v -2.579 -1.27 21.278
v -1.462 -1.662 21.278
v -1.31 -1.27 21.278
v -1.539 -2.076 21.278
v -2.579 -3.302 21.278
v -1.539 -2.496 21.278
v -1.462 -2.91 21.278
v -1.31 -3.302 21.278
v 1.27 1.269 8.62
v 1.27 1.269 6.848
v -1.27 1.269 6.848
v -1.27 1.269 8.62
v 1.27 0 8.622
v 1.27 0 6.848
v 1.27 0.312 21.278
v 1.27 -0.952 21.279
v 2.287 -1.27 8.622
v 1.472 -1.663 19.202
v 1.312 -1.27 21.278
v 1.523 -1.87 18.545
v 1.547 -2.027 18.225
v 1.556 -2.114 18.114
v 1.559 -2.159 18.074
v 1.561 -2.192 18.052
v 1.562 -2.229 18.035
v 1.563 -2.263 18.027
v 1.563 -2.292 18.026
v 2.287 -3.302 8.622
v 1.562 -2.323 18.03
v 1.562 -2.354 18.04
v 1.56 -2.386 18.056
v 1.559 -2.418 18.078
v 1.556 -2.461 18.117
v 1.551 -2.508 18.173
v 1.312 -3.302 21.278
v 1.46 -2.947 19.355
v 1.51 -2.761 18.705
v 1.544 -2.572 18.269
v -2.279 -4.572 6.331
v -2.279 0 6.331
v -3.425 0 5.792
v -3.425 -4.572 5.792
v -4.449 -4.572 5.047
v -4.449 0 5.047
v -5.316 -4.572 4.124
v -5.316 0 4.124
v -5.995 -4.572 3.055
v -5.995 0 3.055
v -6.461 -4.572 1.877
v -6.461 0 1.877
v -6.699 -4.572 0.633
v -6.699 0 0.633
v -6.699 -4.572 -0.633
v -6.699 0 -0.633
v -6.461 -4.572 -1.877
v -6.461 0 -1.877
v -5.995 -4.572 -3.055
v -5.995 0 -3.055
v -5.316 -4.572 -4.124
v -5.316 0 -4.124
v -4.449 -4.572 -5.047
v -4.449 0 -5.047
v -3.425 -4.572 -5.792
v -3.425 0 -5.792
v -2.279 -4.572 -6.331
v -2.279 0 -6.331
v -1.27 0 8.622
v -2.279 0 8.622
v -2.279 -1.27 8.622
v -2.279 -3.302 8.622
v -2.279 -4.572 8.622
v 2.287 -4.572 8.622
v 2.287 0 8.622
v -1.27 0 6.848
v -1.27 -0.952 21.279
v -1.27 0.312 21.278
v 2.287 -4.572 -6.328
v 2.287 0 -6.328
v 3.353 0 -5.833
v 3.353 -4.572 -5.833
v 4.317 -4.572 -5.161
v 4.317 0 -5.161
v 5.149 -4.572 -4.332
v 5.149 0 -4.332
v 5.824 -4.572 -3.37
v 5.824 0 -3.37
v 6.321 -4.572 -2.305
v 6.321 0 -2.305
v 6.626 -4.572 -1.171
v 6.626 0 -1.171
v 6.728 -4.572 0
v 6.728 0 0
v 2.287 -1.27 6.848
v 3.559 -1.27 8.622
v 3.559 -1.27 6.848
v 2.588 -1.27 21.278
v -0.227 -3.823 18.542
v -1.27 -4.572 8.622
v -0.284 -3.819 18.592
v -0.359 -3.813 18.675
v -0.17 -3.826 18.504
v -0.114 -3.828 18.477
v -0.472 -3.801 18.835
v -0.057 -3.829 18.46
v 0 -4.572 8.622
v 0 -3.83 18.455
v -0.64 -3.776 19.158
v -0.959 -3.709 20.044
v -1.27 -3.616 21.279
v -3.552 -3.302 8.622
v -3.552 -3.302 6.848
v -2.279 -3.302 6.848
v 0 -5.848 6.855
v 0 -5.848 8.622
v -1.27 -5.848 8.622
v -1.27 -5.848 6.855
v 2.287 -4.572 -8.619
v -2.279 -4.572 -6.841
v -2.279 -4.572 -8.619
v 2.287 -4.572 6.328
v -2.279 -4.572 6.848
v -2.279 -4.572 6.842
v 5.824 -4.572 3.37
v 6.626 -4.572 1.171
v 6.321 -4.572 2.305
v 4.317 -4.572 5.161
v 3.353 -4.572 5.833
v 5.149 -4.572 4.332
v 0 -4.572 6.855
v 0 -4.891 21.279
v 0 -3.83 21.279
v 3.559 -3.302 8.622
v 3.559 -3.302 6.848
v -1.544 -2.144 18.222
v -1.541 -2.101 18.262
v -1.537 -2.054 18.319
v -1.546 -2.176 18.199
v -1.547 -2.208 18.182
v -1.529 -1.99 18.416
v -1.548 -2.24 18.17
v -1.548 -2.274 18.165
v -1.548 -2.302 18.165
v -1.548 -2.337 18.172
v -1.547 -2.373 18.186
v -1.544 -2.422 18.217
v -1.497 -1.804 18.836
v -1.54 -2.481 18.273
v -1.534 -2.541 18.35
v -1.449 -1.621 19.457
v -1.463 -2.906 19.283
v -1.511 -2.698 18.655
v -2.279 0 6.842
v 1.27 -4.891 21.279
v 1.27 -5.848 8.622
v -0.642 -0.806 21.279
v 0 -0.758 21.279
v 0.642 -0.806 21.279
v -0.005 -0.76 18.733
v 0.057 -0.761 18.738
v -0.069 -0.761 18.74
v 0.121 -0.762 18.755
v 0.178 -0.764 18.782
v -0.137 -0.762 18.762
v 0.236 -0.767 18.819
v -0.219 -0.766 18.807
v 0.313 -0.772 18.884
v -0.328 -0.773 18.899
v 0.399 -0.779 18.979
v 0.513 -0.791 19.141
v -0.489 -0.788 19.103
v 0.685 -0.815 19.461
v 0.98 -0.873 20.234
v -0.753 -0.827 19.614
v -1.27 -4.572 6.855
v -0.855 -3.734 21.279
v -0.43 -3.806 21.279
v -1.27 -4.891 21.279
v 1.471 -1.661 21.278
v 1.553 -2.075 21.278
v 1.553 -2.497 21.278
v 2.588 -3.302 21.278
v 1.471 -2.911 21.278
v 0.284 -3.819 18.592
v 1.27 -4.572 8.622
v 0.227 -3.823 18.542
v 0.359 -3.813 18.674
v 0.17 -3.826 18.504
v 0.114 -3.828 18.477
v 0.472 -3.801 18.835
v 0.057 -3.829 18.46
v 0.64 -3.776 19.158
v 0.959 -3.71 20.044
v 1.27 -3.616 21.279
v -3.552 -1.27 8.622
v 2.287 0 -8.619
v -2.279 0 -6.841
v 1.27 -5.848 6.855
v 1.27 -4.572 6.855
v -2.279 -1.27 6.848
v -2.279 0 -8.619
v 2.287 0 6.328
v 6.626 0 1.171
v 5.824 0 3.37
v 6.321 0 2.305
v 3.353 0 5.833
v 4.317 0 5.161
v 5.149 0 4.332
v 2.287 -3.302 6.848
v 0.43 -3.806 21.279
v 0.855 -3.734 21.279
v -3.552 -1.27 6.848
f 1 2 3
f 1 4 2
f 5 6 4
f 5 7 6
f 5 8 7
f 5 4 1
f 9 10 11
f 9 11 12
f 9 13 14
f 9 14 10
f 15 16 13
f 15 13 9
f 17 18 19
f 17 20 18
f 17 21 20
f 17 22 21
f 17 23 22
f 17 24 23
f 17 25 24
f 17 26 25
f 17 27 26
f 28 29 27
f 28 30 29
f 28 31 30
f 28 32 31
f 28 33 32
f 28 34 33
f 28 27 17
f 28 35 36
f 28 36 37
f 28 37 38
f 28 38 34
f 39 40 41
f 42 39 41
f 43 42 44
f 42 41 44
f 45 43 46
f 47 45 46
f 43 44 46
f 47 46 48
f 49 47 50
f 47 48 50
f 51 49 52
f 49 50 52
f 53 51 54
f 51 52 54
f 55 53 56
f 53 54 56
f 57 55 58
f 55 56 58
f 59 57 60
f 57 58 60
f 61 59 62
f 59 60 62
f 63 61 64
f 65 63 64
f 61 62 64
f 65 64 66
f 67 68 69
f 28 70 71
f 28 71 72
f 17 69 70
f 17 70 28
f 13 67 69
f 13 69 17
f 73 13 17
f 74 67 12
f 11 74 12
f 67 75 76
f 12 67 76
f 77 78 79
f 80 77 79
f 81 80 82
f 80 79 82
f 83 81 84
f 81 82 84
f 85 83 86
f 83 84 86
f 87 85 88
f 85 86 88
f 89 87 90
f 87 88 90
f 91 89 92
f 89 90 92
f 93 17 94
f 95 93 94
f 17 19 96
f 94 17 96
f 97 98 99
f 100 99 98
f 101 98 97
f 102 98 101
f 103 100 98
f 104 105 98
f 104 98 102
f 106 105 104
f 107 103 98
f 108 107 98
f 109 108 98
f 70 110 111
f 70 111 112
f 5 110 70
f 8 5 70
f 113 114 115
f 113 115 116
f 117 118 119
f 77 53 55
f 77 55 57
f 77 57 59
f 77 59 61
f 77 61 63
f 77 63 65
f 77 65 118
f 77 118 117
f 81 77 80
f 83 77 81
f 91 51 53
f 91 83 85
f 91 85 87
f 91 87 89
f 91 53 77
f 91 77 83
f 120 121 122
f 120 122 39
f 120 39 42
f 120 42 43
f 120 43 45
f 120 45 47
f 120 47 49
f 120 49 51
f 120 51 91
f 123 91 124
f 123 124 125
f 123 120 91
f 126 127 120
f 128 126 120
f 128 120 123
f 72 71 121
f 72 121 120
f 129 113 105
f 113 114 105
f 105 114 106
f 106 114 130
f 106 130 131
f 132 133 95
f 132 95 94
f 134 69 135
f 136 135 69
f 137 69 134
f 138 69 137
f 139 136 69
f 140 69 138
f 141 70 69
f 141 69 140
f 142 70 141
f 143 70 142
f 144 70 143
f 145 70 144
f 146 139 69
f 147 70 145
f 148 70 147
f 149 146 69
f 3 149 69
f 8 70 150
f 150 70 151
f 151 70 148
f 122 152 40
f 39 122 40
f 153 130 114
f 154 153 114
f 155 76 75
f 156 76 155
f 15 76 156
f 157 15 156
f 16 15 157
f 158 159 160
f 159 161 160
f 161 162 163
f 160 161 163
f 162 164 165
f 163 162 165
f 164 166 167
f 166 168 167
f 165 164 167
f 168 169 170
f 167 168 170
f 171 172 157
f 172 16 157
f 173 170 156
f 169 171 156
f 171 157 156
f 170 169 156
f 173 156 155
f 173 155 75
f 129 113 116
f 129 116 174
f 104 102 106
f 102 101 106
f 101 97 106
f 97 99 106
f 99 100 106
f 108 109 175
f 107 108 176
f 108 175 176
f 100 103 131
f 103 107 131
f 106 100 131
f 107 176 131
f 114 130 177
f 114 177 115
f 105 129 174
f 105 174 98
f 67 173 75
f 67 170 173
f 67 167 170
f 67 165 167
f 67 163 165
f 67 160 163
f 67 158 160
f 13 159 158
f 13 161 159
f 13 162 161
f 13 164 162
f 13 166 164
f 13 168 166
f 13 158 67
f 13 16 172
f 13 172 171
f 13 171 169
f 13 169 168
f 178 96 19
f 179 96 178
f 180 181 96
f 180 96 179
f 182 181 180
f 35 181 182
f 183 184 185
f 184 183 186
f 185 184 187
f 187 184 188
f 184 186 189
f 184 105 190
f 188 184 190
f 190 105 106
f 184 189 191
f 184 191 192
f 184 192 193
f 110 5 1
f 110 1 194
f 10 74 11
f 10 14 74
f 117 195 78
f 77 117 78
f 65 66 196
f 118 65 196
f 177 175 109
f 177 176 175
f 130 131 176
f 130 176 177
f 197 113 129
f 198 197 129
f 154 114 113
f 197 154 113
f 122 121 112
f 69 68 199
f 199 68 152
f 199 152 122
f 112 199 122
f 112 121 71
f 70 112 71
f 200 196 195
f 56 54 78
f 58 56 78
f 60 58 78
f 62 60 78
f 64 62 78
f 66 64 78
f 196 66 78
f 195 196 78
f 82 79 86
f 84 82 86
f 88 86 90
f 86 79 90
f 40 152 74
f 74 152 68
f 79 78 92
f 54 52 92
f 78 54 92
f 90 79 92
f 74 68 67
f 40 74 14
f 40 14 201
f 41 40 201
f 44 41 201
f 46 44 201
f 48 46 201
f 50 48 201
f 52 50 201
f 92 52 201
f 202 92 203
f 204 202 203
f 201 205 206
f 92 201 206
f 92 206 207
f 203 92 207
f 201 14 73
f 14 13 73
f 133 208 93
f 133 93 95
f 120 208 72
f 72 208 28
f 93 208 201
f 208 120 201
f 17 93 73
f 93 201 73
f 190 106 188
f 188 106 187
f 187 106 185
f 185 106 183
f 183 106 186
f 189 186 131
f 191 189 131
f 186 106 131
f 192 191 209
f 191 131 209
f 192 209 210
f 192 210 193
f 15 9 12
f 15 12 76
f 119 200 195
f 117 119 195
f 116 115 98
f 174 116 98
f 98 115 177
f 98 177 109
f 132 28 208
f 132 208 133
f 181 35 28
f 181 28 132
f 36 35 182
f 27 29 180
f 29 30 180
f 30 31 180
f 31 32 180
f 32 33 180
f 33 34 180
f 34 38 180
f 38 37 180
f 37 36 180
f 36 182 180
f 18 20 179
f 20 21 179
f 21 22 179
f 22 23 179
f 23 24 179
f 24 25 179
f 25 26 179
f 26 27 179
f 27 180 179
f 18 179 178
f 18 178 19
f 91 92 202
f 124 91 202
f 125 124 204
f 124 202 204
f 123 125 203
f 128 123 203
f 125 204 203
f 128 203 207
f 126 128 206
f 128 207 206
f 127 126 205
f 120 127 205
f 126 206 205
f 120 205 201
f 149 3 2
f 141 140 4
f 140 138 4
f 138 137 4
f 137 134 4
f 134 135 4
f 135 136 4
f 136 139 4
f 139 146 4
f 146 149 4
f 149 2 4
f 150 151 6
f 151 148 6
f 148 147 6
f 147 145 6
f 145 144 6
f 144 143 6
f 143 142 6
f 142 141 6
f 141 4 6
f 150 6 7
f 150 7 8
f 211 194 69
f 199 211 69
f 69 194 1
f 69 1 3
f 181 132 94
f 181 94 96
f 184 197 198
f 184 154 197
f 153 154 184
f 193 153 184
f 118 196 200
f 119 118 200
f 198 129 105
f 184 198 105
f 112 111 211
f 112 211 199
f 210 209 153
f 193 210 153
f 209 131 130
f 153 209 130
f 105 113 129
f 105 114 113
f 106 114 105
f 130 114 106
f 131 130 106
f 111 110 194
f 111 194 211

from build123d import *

# Parameters (mm, degrees)
F0_W      = 4.565686686
F0_H      = 1.0178177617
F0_H_2    = 1.0234280489
F0_H_3    = 0.7616141811
F0_H_4    = 0.7546050474
F1_DEPTH  = 4.572
F3_DEPTH  = 1.27
F4_DEPTH  = 1.27
F6_DEPTH  = 3.302
F8_DEPTH  = 1.27
F10_DEPTH = 10.16
F12_DEPTH = 10.16
F14_DEPTH = 10.16
F16_DEPTH = 10.16


with BuildPart() as f1:
    # F0 (on Front) → F1 (new body)
    with BuildSketch(Plane.XZ):
        with BuildLine():
            ThreePointArc((2.2870195098, -6.3278463876), (5.5072772106, -3.865487792), (6.7284543651, 0))
            ThreePointArc((6.7284543651, 0), (5.5072772106, 3.865487792), (2.2870195098, 6.3278463876))
            Line((2.2870195098, 6.3278463876), (2.2870195098, 0))
            Line((2.2870195098, 0), (2.2870195098, -6.3278463876))
        make_face()
        with BuildLine():
            Line((2.2870195098, 0), (2.2870195098, 6.3278463876))
            ThreePointArc((2.2870195098, 6.3278463876), (0.004439497, 6.7284529005), (-2.2786671761, 6.330858871))
            Line((-2.2786671761, 6.330858871), (-2.2786671761, 0))
            Line((-2.2786671761, 0), (0, 0))
            Line((0, 0), (2.2870195098, 0))
        make_face()
        with BuildLine():
            ThreePointArc((-2.2786671761, 6.330858871), (0.004439497, 6.7284529005), (2.2870195098, 6.3278463876))
            Line((2.2870195098, 6.3278463876), (2.2870195098, 6.8423901685))
            Line((2.2870195098, 6.8423901685), (-2.2786671761, 6.8423901685))
            Line((-2.2786671761, 6.8423901685), (-2.2786671761, 6.330858871))
        make_face()
        with BuildLine():
            Line((2.2870195098, -6.8408041261), (2.2870195098, -6.3278463876))
            ThreePointArc((2.2870195098, -6.3278463876), (0.004439497, -6.7284529005), (-2.2786671761, -6.330858871))
            Line((-2.2786671761, -6.330858871), (-2.2786671761, -6.8408041261))
            Line((-2.2786671761, -6.8408041261), (2.2870195098, -6.8408041261))
        make_face()
        with BuildLine():
            ThreePointArc((-2.2786671761, -6.330858871), (0.004439497, -6.7284529005), (2.2870195098, -6.3278463876))
            Line((2.2870195098, -6.3278463876), (2.2870195098, 0))
            Line((2.2870195098, 0), (0, 0))
            Line((0, 0), (-2.2786671761, 0))
            Line((-2.2786671761, 0), (-2.2786671761, -6.330858871))
        make_face()
        with BuildLine():
            Line((-2.2786671761, 0), (-2.2786671761, 6.330858871))
            ThreePointArc((-2.2786671761, 6.330858871), (-6.7284543651, 0), (-2.2786671761, -6.330858871))
            Line((-2.2786671761, -6.330858871), (-2.2786671761, 0))
        make_face()
        with Locations((0.0041761668, 7.3512990493)):
            Rectangle(F0_W, F0_H)
        with Locations((0.0041761668, -7.3525181506)):
            Rectangle(F0_W, F0_H_2)
        with Locations((0.0041761668, 8.2410150208)):
            Rectangle(F0_W, F0_H_3)
        with Locations((0.0041761668, -8.2415346988)):
            Rectangle(F0_W, F0_H_4)
    extrude(amount=F1_DEPTH)

    # F2 (on Right) → F3 (join)
    with BuildSketch(Plane.YZ):
        Polygon((0.3121369207, 8.6214040113), (0, 8.6217308417), (0, 6.8479888141), (1.2692490127, 6.8479888141), (1.2692490127, 8.6204018444), align=None)
        Polygon((-0.9517943535, 21.2794924354), (0, 8.6217308417), (0.3121369207, 8.6214040113), (1.2692490127, 8.6204018444), (0.3121369207, 21.2781690061), align=None)
    extrude(amount=F3_DEPTH)

    # F4 (add): a face of the model
    f4_faces = [f1.faces().sort_by_distance(p)[0] for p in [
        (0, 0.21642848, 14.057832874),
    ]]
    extrude(f4_faces, amount=F4_DEPTH)

    # F5 (on face) → F6 (join)
    with BuildSketch(Plane.XZ.offset(4.572)):
        Polygon((-2.2786671761, 6.8476027809), (-2.2786671761, 8.6218221113), (-2.5794459507, 8.6218221113), (-3.5520868842, 8.6218221113), (-3.5520868842, 6.8476027809), align=None)
        Polygon((-2.5794459507, 8.6218221113), (-2.2786671761, 8.6218221113), (-1.3100903016, 21.2784931064), (-2.5794459507, 21.2784931064), (-3.5520868842, 8.6218221113), align=None)
        Polygon((2.5878376327, 8.6218221113), (2.2870195098, 8.6218221113), (2.2870195098, 6.8476027809), (3.5591647029, 6.8476027809), (3.5591647029, 8.6218221113), align=None)
        Polygon((1.3121798402, 21.2784931064), (2.2870195098, 8.6218221113), (2.5878376327, 8.6218221113), (3.5591647029, 8.6218221113), (2.5878376327, 21.2784931064), align=None)
    extrude(amount=-F6_DEPTH)

    # F7 (on face) → F8 (cut)
    with BuildSketch(Plane.XZ.offset(4.572)):
        Polygon((-2.2786671761, 6.8476027809), (-2.2786671761, 8.6218221113), (-1.3100903016, 21.2784931064), (-2.5794459507, 21.2784931064), (-3.5520868842, 8.6218221113), (-3.5520868842, 6.8476027809), align=None)
        Polygon((1.3121798402, 21.2784931064), (2.2870195098, 8.6218221113), (2.2870195098, 6.8476027809), (3.5591647029, 6.8476027809), (3.5591647029, 8.6218221113), (2.5878376327, 21.2784931064), align=None)
    extrude(amount=-F8_DEPTH, mode=Mode.SUBTRACT)

    # F9 (on face) → F10 (cut)
    with BuildSketch(Plane.XY.offset(21.2784931064)):
        with BuildLine():
            Line((-1.3100903016, -3.302), (-1.3100903016, -1.27))
            ThreePointArc((-1.3100903016, -1.27), (-1.5484129776, -2.286), (-1.3100903016, -3.302))
        make_face()
    extrude(amount=-F10_DEPTH, mode=Mode.SUBTRACT)

    # F11 (on face) → F12 (cut)
    with BuildSketch(Plane(origin=(0, 0.0222801298, 21.2784725075), x_dir=(1, 0, 0), z_dir=(0, 0.0010470732, 0.9999994518))):
        with BuildLine():
            Line((-1.27, -0.9740750174), (1.27, -0.9740750174))
            ThreePointArc((1.27, -0.9740750174), (0, -0.7799036016), (-1.27, -0.9740750174))
        make_face()
    extrude(amount=-F12_DEPTH, mode=Mode.SUBTRACT)

    # F13 (on face) → F14 (cut)
    with BuildSketch(Plane.XY.offset(21.2784931064)):
        with BuildLine():
            Line((1.3121798402, -1.27), (1.3121798402, -3.302))
            ThreePointArc((1.3121798402, -3.302), (1.5627109004, -2.286), (1.3121798402, -1.27))
        make_face()
    extrude(amount=-F14_DEPTH, mode=Mode.SUBTRACT)


with BuildPart() as f3:
    # F2 (on Right) → F3, piece 2 (new body)
    with BuildSketch(Plane.YZ):
        Polygon((-4.5720455237, 6.8546989933), (-4.5720455237, 8.6218202487), (-4.8907813616, 8.6218202487), (-5.8480561711, 8.6218202487), (-5.8480561711, 6.8546989933), align=None)
        Polygon((-4.8907813616, 8.6218202487), (-4.5720455237, 8.6218202487), (-3.6162037868, 21.2794924354), (-4.8907813616, 21.2794924354), (-5.8480561711, 8.6218202487), align=None)
    extrude(amount=F3_DEPTH)


with BuildPart() as f4:
    # F4#2 (new): a face of the model
    f4_2_faces = [f3.part.faces().sort_by_distance(p)[0] for p in [
        (0, -4.790471174, 14.0656200962),
    ]]
    extrude(f4_2_faces, amount=F4_DEPTH)


with BuildPart() as f16_tool:
    # F15 (on face) → F16 (new body)
    with BuildSketch(Plane.XY.offset(21.2794924354)):
        with BuildLine():
            Line((0, -3.6162037868), (0, -3.8295243277))
            ThreePointArc((0, -3.8295243277), (0.6439955035, -3.7758315893), (1.2702000095, -3.6162037868))
            Line((1.2702000095, -3.6162037868), (0, -3.6162037868))
        make_face()
        with BuildLine():
            Line((0, -3.6162037868), (-1.27, -3.6162037868))
            ThreePointArc((-1.27, -3.6162037868), (-0.6438941174, -3.7758150249), (0, -3.8295243277))
            Line((0, -3.8295243277), (0, -3.6162037868))
        make_face()
    extrude(amount=-F16_DEPTH)


with BuildPart() as f3_1:
    add(f3.part)

    # F16: cut by f16_tool
    add(f16_tool.part, mode=Mode.SUBTRACT)


with BuildPart() as f4_1:
    add(f4.part)

    # F16: cut by f16_tool
    add(f16_tool.part, mode=Mode.SUBTRACT)


solid = Compound([f1.part, f3_1.part, f4_1.part])
